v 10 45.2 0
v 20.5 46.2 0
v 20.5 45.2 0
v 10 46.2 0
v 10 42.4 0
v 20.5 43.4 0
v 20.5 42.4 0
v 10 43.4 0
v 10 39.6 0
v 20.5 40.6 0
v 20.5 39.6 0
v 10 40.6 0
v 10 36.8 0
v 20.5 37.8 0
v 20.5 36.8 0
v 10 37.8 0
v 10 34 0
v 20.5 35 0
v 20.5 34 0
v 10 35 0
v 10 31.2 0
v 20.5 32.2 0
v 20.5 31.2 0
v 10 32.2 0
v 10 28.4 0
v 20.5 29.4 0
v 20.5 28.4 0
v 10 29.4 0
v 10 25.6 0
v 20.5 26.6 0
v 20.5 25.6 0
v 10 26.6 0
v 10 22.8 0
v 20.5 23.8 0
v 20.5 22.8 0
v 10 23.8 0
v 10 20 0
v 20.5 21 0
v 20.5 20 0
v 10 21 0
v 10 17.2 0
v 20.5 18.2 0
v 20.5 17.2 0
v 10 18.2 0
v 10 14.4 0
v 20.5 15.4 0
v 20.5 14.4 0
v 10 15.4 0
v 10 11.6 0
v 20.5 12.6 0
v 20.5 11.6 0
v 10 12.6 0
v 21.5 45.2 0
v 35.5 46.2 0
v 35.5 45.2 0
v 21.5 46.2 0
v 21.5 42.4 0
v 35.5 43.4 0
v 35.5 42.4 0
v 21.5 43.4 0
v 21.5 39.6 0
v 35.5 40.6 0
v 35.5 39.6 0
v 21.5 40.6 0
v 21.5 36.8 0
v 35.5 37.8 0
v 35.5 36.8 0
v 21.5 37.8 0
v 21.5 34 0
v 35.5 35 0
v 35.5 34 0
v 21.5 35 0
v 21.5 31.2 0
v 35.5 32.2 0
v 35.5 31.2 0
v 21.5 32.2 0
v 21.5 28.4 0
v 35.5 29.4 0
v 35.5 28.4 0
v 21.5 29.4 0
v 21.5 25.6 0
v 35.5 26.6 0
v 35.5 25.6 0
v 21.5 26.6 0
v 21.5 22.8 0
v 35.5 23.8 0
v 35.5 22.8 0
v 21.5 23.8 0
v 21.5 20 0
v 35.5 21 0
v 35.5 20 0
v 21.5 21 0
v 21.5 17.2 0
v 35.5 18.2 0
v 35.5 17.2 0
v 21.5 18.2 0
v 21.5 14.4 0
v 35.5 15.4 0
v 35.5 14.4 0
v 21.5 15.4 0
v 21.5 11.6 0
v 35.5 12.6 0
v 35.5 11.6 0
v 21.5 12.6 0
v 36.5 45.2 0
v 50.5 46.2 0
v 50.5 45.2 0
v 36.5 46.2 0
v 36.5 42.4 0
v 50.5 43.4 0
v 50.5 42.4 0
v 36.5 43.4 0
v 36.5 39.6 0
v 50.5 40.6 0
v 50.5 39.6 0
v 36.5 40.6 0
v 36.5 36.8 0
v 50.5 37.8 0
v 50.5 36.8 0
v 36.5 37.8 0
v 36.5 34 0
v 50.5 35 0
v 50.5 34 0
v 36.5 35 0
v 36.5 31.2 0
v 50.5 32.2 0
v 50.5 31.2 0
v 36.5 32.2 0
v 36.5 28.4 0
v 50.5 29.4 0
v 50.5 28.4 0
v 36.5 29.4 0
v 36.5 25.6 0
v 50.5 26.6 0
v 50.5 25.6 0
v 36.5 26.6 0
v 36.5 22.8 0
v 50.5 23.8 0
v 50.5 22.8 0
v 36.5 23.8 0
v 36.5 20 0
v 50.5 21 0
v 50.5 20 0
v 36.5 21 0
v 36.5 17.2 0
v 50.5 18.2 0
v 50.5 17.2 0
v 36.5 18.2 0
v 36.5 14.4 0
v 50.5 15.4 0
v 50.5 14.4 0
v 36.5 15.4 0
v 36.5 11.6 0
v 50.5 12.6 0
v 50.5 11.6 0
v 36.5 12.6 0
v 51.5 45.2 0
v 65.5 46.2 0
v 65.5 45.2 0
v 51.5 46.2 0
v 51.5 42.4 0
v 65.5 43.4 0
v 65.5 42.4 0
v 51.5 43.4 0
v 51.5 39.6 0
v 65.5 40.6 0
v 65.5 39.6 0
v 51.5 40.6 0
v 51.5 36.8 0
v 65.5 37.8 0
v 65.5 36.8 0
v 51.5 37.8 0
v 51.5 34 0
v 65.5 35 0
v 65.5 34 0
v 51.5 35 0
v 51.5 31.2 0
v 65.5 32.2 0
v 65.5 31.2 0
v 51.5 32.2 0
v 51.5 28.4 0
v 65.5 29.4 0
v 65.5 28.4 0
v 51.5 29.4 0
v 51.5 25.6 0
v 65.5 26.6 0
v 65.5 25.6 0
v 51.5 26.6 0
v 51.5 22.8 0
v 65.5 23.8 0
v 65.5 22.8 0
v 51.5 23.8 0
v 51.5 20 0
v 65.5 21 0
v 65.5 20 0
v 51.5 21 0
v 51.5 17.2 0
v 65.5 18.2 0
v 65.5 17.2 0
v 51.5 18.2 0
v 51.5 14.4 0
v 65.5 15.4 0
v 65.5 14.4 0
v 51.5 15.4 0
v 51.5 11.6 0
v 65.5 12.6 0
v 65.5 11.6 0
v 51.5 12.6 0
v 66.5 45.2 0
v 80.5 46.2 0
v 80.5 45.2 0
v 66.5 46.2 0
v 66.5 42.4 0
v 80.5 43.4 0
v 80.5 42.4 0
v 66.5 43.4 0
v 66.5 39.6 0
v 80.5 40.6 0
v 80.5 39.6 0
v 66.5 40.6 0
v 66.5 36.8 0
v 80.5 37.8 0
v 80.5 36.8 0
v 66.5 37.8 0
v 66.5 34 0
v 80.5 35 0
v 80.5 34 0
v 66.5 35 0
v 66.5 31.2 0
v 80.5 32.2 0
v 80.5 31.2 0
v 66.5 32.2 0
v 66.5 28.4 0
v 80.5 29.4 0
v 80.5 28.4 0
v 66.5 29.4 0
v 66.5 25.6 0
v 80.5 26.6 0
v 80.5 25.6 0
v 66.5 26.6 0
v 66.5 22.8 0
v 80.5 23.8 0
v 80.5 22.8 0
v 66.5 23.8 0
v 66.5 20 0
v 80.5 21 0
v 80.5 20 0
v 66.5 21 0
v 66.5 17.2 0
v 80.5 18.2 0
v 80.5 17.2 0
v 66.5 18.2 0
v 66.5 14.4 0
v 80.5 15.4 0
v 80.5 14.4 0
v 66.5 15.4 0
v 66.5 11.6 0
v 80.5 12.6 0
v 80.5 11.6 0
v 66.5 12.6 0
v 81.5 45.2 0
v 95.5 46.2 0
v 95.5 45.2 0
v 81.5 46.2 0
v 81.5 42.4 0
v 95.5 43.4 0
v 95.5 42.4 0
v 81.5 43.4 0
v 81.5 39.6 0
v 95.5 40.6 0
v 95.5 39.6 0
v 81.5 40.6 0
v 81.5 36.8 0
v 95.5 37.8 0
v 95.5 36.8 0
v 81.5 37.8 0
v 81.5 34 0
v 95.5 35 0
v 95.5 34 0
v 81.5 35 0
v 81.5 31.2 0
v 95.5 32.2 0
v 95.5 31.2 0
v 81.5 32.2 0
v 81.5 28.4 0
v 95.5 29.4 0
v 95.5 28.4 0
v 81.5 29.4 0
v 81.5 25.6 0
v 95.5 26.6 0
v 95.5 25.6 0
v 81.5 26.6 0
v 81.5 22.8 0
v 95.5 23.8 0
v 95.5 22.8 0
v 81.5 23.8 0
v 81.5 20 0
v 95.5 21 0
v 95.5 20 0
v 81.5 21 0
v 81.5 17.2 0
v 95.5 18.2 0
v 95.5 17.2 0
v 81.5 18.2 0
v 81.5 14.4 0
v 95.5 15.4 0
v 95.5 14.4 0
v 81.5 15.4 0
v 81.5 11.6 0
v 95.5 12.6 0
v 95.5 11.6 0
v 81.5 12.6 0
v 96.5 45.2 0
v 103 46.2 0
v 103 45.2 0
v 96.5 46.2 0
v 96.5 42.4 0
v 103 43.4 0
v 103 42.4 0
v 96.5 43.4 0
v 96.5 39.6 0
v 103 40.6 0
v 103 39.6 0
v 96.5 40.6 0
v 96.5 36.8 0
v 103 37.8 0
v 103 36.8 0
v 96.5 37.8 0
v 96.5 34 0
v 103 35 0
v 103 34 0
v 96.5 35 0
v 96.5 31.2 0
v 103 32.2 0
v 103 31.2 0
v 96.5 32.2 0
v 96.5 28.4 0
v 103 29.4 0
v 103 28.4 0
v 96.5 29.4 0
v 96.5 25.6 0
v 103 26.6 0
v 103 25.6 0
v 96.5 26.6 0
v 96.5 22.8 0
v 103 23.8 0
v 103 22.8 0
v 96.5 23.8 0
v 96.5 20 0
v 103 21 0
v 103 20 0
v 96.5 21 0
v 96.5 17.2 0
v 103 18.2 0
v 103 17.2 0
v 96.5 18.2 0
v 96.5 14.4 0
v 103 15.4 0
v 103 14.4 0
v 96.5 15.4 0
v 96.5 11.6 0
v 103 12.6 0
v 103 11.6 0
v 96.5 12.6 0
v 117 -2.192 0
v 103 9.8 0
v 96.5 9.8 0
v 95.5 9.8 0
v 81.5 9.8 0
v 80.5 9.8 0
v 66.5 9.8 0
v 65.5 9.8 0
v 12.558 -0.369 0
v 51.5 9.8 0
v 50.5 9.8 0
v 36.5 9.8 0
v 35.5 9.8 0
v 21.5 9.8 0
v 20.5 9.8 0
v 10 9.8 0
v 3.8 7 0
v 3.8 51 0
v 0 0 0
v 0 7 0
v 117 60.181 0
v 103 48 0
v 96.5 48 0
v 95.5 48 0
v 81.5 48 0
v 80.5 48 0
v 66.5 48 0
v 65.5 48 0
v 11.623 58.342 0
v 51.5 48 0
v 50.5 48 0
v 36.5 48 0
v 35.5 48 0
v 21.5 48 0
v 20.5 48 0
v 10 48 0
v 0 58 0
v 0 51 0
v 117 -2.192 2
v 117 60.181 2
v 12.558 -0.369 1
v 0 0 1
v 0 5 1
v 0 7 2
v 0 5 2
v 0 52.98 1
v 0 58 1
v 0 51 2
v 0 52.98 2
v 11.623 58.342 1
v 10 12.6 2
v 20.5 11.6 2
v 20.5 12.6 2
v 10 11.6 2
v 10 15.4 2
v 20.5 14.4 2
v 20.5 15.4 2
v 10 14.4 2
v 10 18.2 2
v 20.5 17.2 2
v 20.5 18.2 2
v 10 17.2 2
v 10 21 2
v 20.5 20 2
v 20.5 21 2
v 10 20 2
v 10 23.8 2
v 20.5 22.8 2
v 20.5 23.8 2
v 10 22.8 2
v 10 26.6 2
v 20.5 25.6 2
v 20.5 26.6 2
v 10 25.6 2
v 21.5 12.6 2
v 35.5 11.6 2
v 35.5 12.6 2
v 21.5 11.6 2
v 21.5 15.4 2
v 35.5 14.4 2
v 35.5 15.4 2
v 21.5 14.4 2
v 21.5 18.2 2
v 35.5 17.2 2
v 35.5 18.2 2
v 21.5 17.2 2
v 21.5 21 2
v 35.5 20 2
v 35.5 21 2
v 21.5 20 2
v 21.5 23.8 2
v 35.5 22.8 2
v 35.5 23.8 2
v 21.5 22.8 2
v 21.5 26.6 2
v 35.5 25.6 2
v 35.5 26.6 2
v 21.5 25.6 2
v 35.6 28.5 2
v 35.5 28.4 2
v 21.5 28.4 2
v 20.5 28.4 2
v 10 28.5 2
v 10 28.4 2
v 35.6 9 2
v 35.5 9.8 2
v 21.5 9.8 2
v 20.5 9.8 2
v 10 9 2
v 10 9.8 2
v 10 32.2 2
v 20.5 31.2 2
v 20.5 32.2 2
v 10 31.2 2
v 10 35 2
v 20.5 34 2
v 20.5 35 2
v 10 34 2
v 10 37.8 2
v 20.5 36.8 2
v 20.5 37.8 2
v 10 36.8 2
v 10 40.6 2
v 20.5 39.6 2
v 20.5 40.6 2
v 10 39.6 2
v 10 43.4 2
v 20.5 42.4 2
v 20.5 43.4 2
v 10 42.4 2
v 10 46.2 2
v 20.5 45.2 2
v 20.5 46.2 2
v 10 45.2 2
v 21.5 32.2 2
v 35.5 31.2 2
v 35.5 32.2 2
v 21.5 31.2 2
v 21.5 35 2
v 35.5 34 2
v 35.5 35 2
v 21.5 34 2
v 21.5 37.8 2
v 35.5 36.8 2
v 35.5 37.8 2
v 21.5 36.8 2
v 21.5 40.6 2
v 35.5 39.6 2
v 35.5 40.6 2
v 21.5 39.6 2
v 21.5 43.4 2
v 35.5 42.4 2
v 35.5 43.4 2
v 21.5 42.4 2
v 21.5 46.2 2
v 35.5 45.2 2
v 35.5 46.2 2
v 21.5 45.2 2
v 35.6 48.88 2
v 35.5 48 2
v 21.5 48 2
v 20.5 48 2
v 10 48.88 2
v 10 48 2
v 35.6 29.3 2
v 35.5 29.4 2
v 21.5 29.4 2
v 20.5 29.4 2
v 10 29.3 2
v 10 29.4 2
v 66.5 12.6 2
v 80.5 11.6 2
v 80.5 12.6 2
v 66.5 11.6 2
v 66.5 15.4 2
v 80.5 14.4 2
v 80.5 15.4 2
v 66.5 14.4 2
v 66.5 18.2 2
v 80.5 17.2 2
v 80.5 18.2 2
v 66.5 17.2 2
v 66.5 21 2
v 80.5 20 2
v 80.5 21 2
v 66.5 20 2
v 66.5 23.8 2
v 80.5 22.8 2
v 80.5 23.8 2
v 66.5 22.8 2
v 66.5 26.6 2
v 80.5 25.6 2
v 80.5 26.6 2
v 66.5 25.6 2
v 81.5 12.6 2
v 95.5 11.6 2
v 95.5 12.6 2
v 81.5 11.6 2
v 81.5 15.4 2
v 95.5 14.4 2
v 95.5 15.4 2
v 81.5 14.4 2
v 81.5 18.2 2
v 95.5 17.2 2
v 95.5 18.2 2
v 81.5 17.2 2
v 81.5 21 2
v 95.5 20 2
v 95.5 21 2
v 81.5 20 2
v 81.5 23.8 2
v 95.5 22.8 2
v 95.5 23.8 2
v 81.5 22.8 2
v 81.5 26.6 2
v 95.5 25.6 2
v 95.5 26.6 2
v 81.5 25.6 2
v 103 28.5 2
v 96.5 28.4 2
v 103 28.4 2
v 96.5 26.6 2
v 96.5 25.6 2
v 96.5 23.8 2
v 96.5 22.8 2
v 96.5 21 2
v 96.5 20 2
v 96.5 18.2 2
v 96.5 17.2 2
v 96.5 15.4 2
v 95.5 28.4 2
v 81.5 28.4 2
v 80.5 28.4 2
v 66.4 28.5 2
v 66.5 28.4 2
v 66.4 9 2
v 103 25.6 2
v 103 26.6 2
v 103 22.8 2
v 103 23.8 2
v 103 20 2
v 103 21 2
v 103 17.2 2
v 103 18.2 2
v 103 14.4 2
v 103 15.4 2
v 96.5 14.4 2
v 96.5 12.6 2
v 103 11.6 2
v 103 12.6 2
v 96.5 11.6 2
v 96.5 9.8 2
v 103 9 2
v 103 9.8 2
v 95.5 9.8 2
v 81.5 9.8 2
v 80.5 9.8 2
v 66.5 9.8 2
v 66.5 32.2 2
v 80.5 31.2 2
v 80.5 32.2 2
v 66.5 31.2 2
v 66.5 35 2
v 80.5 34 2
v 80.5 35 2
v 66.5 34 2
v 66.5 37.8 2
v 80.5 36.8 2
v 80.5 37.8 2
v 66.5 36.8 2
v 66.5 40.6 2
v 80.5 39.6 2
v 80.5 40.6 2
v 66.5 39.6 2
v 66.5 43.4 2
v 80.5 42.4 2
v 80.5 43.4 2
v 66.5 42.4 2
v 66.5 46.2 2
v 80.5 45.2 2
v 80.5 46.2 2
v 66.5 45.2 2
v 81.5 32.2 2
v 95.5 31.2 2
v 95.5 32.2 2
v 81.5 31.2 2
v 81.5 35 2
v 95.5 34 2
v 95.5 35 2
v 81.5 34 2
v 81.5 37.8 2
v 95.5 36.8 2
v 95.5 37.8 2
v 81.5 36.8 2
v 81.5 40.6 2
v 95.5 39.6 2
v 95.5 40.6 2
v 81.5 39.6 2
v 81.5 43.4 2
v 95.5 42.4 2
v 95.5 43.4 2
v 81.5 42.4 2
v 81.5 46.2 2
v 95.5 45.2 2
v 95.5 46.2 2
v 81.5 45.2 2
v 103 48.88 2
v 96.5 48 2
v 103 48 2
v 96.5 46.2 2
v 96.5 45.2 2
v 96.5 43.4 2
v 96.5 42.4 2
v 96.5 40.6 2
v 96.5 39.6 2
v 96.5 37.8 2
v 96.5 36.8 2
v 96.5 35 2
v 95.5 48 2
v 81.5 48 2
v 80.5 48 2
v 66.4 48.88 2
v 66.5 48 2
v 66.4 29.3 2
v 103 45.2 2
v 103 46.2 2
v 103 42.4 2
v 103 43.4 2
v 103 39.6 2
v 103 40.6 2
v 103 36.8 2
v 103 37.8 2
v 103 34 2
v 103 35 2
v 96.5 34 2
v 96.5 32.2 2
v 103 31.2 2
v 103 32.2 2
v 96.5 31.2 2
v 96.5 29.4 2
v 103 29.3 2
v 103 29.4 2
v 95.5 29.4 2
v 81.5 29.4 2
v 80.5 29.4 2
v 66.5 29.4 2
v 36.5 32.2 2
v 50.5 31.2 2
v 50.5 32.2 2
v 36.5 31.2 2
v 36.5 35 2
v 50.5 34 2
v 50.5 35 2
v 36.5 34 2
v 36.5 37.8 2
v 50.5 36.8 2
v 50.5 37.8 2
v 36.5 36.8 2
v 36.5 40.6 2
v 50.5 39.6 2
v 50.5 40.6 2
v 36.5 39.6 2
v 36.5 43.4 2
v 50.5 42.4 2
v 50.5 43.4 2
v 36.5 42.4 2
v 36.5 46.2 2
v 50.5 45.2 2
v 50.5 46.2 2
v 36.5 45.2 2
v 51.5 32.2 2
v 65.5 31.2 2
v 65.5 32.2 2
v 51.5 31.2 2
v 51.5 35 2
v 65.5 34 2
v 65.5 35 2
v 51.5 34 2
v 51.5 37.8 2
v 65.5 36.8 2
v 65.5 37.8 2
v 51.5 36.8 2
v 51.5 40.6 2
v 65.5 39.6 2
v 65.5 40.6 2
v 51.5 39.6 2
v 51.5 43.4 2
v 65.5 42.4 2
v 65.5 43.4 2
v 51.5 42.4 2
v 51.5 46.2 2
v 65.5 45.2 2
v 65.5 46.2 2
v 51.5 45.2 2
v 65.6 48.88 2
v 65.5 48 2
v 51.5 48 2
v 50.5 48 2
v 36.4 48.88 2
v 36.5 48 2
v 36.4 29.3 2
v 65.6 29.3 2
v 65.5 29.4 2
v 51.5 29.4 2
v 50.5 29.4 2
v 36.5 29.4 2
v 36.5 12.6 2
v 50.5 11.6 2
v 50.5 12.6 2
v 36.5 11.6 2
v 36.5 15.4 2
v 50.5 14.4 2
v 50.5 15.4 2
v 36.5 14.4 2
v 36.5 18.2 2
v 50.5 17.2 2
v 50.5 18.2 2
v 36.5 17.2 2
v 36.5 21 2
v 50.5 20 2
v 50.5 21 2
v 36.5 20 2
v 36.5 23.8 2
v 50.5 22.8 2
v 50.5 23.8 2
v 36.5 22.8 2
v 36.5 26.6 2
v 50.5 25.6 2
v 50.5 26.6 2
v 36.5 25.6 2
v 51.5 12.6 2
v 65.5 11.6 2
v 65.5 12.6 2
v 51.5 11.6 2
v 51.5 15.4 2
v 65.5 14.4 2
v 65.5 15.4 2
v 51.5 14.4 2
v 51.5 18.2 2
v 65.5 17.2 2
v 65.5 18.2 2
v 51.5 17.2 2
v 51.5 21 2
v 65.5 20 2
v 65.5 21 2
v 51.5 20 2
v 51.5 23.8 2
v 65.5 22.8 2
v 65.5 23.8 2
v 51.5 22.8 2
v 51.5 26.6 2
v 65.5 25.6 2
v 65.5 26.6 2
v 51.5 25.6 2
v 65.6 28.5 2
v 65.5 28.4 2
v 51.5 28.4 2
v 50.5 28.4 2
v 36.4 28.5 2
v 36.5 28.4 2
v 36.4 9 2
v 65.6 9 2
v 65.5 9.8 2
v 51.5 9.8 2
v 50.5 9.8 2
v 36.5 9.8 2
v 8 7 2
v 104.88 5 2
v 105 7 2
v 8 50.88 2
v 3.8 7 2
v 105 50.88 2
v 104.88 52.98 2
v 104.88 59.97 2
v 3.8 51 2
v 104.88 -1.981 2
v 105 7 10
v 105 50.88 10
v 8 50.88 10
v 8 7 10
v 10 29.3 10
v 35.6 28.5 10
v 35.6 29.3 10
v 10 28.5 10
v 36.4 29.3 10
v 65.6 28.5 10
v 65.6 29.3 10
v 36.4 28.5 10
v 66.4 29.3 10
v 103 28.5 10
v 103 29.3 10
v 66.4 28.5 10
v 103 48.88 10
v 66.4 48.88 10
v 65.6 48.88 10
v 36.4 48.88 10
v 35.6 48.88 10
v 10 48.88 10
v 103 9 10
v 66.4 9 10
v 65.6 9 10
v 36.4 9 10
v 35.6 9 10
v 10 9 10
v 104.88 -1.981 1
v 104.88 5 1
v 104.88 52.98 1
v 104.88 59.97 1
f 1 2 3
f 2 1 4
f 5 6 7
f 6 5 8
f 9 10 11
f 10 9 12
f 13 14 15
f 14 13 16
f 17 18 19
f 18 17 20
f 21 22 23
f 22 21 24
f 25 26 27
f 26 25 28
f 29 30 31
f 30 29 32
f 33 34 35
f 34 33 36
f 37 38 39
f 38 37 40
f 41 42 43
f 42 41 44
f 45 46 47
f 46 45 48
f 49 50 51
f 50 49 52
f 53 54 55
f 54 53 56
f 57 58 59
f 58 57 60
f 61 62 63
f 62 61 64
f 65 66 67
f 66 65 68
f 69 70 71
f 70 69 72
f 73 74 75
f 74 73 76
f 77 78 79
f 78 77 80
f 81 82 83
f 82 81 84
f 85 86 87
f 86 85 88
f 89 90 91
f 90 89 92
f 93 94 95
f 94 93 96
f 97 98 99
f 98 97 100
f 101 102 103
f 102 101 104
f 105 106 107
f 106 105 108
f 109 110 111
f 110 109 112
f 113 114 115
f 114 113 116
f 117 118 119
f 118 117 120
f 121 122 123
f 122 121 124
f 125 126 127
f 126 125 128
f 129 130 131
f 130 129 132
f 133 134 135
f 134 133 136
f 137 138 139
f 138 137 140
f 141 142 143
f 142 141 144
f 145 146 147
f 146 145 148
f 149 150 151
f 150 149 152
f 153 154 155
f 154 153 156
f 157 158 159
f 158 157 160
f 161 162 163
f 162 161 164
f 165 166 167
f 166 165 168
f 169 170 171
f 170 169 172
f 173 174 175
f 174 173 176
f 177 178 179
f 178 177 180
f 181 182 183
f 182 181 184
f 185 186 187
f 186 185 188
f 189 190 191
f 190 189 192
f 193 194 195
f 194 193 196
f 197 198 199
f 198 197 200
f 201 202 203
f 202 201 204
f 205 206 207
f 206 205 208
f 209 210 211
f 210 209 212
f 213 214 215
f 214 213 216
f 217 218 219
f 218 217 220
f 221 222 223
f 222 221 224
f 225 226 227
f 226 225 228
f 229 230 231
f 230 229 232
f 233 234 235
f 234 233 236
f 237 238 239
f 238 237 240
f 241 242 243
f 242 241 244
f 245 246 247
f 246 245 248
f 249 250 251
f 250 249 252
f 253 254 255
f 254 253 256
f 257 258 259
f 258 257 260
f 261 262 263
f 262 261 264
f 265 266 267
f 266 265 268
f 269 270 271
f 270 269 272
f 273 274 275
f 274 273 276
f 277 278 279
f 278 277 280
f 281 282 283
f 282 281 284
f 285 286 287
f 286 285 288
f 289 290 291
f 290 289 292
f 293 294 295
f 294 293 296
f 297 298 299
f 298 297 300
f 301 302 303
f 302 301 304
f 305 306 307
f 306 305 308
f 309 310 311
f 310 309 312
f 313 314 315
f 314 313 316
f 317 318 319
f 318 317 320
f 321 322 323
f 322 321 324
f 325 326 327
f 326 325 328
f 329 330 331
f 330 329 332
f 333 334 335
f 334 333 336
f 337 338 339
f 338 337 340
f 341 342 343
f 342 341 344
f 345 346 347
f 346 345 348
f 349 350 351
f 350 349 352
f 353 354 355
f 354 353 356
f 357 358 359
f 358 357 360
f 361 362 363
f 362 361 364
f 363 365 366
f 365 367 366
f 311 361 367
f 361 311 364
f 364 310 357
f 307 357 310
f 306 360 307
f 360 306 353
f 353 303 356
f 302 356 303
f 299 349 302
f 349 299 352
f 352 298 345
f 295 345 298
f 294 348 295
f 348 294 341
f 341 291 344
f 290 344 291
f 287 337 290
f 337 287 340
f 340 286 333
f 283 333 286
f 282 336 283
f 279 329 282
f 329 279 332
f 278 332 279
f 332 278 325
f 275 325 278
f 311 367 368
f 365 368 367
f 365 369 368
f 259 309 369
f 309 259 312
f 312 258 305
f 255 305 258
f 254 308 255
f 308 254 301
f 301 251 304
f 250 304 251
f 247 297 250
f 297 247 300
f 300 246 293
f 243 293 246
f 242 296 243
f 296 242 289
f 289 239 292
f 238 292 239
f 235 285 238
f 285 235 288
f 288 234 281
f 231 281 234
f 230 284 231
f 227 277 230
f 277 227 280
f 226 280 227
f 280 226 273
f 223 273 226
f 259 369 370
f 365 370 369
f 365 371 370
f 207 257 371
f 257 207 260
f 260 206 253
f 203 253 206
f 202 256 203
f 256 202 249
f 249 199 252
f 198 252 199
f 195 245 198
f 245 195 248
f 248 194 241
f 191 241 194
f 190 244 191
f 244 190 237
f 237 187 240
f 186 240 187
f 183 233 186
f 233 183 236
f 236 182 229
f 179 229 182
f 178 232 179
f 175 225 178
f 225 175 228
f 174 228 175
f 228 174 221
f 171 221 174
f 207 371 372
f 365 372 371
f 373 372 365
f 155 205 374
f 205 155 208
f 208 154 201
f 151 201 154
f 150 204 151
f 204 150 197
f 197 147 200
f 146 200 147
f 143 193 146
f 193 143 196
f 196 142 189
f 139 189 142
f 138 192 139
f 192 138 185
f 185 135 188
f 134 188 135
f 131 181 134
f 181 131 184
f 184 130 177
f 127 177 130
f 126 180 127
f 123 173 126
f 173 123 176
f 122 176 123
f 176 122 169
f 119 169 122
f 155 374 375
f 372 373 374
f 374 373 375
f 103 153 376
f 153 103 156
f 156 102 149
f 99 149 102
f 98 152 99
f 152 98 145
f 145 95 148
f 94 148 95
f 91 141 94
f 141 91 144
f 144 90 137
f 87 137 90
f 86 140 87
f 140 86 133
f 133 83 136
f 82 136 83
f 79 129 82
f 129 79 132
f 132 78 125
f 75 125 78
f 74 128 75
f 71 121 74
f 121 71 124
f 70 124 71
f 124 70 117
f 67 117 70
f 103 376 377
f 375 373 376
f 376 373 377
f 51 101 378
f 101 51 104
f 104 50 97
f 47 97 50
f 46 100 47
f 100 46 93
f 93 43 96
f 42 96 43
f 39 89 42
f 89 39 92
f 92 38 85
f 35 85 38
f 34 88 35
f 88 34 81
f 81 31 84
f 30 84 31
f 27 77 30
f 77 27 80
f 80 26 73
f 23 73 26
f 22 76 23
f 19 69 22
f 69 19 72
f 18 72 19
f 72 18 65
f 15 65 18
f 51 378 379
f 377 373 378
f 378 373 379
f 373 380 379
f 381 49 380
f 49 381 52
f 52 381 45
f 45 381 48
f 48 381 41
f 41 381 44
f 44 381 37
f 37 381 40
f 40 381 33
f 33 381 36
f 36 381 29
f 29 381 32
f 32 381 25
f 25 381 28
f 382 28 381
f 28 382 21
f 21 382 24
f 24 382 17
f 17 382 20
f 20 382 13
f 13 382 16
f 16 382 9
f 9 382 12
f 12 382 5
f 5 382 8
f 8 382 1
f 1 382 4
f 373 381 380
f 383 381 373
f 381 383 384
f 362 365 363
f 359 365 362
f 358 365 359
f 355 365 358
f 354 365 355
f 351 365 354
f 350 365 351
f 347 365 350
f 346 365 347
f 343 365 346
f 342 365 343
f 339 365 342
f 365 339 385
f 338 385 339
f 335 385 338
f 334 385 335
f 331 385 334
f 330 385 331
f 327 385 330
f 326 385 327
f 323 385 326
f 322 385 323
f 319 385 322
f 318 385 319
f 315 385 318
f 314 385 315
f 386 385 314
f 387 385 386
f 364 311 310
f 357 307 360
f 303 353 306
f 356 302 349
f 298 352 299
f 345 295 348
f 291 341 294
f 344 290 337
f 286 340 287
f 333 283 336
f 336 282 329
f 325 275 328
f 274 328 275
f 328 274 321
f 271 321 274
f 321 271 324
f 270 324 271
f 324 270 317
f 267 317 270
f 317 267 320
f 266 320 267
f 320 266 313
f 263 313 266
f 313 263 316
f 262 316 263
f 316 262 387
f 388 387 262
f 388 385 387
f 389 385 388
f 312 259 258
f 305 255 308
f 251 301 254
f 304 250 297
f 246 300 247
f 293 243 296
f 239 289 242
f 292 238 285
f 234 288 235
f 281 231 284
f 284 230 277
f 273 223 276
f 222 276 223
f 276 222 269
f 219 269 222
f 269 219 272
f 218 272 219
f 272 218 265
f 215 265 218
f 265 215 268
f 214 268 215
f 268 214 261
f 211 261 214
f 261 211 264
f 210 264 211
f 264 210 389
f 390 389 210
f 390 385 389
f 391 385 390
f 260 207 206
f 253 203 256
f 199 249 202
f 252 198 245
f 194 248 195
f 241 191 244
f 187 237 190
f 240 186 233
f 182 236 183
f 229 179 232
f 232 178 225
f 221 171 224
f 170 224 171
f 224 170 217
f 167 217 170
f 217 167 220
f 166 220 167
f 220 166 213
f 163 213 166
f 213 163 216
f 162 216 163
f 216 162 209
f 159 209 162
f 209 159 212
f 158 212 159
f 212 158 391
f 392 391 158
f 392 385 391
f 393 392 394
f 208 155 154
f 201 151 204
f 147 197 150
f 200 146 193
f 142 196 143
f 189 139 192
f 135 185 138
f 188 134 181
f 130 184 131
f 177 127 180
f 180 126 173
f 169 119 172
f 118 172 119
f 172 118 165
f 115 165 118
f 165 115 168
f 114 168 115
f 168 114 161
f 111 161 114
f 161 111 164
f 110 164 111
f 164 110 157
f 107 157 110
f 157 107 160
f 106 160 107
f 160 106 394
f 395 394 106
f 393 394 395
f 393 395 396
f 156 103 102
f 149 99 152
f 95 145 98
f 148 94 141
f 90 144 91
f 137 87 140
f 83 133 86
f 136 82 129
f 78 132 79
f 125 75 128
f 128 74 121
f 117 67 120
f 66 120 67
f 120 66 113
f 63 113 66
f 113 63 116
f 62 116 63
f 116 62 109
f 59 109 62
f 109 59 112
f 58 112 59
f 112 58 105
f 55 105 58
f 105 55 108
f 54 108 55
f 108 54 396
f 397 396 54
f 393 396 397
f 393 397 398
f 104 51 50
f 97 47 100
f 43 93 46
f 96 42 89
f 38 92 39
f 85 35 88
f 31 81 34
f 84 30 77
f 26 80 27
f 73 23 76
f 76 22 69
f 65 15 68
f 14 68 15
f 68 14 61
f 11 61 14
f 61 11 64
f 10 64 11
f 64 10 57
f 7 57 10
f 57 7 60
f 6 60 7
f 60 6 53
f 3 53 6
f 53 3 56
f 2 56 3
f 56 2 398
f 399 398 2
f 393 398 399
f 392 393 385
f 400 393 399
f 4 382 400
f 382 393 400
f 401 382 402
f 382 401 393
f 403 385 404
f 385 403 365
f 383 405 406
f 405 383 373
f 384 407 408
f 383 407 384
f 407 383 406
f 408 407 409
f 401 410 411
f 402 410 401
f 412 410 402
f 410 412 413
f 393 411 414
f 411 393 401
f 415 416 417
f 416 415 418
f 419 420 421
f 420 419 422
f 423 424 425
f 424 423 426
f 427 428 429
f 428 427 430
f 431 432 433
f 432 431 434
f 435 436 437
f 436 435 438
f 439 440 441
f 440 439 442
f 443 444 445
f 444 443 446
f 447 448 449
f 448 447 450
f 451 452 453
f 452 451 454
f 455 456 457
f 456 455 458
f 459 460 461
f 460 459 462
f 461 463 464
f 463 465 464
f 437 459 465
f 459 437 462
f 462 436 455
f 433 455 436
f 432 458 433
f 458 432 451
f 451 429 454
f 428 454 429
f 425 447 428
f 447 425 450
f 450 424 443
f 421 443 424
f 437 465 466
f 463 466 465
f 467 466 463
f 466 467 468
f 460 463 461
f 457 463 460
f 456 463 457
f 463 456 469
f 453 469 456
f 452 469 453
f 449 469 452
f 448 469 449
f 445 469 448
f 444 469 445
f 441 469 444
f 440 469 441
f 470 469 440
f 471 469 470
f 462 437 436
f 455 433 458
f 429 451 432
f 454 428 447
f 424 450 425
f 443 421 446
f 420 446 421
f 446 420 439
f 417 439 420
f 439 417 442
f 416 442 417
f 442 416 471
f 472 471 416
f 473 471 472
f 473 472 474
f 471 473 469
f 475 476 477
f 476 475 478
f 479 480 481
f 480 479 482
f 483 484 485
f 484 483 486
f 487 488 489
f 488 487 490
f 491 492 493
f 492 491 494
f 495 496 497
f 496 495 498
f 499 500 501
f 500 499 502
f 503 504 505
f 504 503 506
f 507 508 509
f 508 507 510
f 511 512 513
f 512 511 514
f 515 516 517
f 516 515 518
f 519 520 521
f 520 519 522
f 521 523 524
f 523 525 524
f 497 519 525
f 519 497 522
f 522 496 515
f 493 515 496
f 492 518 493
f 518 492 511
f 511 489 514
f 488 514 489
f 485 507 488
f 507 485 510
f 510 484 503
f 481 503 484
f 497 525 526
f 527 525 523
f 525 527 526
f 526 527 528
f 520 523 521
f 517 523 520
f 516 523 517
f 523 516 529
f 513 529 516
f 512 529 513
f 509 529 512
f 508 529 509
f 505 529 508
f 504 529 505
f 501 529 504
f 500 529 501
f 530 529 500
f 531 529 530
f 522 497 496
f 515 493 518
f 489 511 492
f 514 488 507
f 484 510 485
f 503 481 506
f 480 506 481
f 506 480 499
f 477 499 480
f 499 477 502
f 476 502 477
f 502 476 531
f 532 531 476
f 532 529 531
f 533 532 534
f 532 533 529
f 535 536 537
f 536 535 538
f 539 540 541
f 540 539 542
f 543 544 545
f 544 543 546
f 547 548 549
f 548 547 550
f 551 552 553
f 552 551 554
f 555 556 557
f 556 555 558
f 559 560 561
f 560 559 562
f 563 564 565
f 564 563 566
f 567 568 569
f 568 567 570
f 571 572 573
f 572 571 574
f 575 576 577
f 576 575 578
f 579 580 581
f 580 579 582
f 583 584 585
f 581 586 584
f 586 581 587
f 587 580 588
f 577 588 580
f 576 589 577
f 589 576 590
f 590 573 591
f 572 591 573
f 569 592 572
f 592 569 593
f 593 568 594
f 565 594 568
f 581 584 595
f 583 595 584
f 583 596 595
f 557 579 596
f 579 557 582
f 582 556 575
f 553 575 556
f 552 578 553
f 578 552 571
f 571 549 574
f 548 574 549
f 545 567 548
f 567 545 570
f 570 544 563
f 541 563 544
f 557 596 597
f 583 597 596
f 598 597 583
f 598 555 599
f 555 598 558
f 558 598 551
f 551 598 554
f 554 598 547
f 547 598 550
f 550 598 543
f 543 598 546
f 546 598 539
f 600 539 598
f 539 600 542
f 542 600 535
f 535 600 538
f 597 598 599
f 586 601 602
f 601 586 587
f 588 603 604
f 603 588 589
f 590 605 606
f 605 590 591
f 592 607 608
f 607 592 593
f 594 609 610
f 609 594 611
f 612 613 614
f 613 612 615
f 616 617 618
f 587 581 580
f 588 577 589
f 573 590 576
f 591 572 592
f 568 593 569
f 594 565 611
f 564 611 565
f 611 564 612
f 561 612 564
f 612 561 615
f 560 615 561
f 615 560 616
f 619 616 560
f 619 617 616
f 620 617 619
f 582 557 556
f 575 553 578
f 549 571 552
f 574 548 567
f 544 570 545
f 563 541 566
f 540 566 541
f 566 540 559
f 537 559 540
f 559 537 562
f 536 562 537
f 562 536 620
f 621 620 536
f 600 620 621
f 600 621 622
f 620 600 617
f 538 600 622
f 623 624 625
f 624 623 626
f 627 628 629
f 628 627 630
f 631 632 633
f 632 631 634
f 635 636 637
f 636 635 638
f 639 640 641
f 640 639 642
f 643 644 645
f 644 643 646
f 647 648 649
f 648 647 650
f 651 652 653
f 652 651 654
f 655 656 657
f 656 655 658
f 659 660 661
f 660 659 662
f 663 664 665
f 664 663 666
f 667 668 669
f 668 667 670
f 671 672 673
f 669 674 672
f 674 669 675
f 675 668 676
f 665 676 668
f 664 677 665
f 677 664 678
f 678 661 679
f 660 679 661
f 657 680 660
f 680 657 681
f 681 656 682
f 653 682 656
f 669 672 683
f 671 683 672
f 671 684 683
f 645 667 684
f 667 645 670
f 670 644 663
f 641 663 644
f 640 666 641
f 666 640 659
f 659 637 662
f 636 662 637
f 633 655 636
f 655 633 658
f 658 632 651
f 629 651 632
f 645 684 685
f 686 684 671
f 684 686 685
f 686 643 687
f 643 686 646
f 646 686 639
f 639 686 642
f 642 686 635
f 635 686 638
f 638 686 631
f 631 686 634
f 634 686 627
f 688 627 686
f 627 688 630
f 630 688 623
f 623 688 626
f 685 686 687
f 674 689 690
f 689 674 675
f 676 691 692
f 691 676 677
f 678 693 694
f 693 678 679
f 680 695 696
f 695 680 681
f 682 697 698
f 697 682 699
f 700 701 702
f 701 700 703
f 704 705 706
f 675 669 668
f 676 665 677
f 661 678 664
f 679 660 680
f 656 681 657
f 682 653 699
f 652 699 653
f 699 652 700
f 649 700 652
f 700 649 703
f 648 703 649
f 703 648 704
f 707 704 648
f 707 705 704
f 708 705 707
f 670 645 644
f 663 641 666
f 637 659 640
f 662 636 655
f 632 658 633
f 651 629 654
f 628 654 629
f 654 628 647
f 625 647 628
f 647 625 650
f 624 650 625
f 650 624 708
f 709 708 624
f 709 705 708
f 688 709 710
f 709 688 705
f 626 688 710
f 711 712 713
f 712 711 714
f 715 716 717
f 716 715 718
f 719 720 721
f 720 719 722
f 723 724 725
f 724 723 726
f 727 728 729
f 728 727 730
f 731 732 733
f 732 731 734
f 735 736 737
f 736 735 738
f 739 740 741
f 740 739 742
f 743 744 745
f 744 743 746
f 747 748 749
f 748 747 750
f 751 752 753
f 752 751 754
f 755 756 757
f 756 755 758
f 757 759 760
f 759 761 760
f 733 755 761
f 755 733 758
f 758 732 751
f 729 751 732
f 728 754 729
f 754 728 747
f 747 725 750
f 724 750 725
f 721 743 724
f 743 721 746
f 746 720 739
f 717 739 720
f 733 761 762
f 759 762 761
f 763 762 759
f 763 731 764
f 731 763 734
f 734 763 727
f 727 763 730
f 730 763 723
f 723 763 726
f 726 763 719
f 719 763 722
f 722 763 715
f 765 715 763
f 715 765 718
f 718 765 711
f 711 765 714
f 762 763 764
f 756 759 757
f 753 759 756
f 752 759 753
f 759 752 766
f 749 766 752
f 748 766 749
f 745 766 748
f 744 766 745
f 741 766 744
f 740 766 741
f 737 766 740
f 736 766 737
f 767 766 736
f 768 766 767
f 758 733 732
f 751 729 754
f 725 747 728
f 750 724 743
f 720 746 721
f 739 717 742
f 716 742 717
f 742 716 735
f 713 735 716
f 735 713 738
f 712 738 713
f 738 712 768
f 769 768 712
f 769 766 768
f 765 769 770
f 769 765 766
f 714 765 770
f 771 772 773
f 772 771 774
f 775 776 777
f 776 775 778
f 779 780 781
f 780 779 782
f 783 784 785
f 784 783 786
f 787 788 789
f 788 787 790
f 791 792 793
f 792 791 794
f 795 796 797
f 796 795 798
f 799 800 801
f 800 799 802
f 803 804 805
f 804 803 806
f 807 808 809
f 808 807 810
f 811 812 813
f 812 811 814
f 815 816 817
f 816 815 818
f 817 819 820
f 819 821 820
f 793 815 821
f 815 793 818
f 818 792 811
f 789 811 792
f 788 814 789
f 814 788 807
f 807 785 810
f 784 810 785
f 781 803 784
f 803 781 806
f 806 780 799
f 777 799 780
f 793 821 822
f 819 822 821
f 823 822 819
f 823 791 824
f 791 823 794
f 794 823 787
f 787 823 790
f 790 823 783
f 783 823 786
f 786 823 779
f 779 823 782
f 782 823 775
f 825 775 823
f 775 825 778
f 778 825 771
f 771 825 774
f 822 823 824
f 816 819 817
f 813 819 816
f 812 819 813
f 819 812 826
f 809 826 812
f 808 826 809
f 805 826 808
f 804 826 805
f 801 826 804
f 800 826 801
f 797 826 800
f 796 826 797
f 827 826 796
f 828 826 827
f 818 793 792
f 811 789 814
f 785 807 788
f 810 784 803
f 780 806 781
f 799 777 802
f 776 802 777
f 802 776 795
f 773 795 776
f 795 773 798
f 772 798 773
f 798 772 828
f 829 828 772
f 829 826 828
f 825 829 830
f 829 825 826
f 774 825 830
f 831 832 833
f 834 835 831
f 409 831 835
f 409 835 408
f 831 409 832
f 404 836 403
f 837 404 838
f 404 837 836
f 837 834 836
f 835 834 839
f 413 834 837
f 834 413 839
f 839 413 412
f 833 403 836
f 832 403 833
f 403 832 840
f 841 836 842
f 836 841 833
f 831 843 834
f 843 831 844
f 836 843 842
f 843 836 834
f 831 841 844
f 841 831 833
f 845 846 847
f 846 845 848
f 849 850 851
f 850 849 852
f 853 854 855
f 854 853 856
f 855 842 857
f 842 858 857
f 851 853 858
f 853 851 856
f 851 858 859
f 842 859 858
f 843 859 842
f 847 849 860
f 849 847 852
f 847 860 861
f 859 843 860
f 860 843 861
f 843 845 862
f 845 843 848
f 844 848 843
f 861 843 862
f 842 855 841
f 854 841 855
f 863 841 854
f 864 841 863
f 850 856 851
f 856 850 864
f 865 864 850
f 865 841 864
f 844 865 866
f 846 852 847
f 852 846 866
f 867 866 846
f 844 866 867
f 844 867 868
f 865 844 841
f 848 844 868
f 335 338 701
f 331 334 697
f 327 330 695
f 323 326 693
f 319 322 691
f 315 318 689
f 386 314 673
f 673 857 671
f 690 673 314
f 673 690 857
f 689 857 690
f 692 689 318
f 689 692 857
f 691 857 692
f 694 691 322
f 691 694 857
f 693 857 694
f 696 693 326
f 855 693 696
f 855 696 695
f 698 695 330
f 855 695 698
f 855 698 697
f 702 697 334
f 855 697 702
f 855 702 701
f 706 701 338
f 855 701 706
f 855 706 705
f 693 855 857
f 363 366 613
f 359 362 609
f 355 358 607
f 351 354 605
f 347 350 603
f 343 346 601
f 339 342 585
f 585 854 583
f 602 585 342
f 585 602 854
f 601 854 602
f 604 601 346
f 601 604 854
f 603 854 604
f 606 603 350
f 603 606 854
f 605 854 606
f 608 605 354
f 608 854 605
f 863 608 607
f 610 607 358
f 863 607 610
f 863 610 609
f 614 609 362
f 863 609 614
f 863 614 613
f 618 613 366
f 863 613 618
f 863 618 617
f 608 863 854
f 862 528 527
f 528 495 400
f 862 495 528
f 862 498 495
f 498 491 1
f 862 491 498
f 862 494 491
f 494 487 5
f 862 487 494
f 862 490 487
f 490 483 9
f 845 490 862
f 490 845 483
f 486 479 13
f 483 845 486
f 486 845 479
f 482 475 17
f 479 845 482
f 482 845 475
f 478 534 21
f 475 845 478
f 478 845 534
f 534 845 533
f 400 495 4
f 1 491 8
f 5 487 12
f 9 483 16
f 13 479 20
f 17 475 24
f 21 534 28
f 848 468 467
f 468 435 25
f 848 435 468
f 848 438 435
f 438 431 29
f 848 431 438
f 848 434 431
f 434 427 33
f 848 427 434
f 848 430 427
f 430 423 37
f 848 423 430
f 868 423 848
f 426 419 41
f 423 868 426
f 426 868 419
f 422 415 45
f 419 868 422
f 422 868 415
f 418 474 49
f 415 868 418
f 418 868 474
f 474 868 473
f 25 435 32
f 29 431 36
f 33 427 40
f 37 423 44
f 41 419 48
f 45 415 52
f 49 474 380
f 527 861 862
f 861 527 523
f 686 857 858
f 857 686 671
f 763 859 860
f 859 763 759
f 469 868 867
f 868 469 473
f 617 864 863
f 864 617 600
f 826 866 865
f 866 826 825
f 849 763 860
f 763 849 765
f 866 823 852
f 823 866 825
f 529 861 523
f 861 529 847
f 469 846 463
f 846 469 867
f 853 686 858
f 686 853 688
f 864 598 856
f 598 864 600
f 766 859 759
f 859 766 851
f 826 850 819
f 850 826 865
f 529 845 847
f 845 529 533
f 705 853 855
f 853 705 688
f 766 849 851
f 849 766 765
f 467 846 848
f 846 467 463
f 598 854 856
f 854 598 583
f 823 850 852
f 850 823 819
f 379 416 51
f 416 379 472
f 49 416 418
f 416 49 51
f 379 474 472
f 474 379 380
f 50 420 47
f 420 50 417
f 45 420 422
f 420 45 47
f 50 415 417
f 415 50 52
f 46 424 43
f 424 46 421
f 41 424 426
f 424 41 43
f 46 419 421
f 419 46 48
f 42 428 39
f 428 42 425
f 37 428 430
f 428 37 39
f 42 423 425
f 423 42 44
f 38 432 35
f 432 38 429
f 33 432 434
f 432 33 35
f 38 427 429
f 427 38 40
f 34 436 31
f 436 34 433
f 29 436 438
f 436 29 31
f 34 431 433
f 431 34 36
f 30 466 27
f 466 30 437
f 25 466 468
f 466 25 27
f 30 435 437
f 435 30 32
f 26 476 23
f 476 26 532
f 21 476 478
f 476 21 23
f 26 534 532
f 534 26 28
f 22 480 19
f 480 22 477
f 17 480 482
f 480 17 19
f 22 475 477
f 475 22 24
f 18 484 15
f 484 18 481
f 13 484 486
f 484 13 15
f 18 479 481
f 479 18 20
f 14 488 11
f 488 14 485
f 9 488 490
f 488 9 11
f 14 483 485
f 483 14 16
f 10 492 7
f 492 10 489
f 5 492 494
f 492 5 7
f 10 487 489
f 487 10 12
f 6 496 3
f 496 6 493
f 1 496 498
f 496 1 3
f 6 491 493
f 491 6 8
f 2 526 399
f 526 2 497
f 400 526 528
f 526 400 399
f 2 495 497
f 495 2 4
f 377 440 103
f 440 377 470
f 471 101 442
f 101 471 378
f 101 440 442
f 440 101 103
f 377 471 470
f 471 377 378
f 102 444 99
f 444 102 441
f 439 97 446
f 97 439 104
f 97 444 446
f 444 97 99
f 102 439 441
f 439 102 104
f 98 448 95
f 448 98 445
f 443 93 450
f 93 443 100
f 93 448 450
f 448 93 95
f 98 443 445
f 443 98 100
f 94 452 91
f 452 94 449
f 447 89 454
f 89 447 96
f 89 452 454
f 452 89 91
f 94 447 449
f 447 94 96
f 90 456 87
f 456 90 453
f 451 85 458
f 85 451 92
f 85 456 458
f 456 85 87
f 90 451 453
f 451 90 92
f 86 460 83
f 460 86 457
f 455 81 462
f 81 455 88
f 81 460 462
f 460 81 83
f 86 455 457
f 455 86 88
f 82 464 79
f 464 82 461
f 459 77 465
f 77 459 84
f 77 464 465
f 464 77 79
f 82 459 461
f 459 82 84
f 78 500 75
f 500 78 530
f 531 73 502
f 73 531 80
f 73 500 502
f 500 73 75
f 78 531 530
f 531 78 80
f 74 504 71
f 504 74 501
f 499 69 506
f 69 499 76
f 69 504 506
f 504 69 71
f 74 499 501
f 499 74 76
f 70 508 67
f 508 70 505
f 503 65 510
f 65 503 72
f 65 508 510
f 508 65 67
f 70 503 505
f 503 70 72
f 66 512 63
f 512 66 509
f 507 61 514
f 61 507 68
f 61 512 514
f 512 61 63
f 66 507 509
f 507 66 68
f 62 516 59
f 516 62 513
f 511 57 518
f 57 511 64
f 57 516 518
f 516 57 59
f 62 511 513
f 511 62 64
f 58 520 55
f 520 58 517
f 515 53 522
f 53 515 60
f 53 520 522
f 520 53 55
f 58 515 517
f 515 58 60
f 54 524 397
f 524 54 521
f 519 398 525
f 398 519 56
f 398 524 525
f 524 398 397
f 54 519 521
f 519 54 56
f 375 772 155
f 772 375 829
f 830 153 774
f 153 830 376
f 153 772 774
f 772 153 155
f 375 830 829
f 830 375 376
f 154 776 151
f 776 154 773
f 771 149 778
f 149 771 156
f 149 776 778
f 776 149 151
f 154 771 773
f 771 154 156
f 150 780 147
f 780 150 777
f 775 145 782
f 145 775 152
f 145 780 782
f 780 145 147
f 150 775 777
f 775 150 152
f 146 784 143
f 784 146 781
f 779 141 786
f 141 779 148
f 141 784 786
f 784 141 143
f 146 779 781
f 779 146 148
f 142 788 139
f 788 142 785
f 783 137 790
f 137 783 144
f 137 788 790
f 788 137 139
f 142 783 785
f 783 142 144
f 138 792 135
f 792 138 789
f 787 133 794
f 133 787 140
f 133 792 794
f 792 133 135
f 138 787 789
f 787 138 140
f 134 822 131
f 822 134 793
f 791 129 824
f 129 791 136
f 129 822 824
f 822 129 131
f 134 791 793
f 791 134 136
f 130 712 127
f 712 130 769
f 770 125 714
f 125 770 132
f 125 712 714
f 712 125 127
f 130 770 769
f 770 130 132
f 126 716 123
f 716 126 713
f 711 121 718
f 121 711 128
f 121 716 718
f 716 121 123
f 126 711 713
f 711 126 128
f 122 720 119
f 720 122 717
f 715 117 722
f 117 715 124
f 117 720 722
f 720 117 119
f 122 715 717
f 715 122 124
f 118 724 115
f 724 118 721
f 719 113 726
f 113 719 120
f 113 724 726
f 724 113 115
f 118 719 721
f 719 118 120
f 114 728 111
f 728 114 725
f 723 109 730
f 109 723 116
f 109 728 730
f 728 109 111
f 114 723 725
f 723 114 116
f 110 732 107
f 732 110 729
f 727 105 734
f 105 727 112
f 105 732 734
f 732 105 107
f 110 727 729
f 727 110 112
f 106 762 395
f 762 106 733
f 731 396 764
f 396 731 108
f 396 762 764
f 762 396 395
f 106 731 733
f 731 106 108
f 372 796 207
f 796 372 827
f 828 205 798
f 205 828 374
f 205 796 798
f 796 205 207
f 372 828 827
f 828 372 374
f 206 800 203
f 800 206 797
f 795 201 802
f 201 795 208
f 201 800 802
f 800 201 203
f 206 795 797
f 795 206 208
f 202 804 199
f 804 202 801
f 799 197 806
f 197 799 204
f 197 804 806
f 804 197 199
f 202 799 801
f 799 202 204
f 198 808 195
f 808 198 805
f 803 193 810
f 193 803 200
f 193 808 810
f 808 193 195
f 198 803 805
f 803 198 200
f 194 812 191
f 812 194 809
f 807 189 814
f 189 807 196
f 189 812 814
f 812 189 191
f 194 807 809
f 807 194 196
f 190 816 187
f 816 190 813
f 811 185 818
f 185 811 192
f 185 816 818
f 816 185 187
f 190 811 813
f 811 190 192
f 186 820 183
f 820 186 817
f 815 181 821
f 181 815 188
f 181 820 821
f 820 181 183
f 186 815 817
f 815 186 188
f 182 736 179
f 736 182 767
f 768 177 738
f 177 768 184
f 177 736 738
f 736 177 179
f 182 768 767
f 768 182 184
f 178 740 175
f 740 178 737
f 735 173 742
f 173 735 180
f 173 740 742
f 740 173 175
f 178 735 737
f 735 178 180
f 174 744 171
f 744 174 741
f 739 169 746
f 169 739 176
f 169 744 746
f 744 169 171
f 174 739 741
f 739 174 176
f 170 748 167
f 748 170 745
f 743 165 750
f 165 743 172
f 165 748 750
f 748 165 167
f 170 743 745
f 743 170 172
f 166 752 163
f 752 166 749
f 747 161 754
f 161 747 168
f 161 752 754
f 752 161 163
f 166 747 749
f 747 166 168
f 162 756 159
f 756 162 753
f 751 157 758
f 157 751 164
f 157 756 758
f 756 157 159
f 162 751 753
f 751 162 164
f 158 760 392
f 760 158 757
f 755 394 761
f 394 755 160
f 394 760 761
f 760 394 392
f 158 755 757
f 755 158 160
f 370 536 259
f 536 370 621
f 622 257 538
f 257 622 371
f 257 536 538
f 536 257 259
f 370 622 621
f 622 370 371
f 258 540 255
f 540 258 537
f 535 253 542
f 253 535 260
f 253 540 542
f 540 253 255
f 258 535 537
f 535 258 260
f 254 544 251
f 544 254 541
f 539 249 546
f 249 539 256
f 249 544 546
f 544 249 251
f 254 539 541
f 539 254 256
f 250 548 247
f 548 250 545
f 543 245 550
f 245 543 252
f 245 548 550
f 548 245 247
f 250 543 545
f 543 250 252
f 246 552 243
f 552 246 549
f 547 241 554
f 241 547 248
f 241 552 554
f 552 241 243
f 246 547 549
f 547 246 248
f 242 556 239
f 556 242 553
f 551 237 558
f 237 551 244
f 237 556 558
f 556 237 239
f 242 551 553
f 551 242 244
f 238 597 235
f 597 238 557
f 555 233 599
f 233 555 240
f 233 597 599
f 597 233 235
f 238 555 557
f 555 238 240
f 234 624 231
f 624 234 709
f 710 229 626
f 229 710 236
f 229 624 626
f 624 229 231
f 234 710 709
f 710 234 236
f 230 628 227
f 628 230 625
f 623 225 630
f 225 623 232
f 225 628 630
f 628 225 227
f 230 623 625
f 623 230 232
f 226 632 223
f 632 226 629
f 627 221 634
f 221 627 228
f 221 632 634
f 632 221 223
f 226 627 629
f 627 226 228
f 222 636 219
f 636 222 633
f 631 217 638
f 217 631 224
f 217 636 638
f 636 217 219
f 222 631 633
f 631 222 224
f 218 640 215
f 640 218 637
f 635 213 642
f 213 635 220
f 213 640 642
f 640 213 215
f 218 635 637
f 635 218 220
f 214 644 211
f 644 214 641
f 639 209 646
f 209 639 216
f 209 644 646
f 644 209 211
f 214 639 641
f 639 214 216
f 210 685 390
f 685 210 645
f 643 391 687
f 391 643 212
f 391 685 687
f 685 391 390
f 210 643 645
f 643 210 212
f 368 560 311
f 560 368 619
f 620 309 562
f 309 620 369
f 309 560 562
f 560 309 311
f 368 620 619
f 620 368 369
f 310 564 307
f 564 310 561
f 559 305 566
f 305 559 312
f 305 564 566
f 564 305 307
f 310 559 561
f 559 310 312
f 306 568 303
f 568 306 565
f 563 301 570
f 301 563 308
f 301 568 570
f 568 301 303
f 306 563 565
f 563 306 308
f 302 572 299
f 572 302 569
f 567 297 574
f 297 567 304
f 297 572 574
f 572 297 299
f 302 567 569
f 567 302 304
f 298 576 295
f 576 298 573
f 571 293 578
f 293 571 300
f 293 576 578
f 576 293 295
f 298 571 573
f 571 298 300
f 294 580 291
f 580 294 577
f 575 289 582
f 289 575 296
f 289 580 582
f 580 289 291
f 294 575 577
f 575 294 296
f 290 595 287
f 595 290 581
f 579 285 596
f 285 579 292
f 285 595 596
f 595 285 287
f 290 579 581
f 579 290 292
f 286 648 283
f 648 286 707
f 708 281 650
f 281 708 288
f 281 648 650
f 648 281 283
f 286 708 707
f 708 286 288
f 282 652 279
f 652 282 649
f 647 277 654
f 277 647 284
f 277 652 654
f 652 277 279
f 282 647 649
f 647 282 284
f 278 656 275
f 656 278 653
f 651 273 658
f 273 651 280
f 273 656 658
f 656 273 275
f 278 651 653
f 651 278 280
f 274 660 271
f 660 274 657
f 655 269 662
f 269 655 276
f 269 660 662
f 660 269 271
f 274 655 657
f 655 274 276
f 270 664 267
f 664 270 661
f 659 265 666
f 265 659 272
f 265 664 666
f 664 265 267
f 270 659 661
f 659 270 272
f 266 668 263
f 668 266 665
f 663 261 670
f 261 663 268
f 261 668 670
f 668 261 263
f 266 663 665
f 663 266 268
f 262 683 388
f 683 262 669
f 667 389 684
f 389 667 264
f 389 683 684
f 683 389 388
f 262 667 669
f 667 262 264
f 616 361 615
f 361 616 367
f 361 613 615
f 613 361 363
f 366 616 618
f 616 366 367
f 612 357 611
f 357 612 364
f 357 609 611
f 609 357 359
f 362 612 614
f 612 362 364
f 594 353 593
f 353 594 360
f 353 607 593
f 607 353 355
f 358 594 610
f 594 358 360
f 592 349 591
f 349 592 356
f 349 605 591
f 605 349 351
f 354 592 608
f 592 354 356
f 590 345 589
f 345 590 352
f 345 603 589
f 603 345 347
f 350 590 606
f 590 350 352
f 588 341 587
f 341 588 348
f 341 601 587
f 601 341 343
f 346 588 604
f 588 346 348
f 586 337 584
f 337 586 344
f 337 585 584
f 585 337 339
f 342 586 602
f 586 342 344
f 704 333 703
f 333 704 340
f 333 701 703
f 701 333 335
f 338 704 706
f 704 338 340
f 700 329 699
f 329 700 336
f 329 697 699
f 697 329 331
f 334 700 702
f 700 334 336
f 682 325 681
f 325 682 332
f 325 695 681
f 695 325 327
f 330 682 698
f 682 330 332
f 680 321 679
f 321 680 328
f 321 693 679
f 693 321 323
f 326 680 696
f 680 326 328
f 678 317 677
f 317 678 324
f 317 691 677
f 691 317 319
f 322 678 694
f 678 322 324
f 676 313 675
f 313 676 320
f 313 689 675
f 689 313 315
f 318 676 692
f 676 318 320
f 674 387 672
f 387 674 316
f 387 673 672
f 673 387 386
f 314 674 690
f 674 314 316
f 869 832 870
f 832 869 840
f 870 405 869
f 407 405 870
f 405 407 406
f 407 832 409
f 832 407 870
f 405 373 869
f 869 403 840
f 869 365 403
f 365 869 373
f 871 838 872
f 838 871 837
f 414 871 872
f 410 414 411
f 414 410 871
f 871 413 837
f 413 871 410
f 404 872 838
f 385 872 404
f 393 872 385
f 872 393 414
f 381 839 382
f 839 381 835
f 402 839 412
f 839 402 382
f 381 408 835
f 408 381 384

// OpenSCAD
//labeled combo box for string
Opcao_Gerar="P"; // [P:Principal, T:Topo]

seleciona();

module seleciona() {
  if (Opcao_Gerar == "P") makePrincipal();
  if (Opcao_Gerar == "T") makeTopo();
}

//parametros
lMin = 58;
lMax = 64.88; //63
comp = 117;
altura = 2;
bordaL = 15;
heigth = 10;

// --------------------------------------------
module makePrincipal(addEncaixe = true) {
    difference() {
    union() {
        body();
        if (addEncaixe == true) addEncaixe();

        gridPattern();
    }

    bodyCorte();
    }
}

module makeTopo() {
    //color("black")
    //translate([0,0,2])
    bodyTopo();
}

module cuteBottom() {
  translate([-6.2,7,-2])
  color("black")
  cube([10,44,6]);
}

module addEncaixe() {
iMax = lMax - bordaL - (4+2);
icomp = comp - bordaL - 5;

union() {
    difference() {

    color("red")
    translate([bordaL-(9-2),bordaL-(10-2),0])
    cube([icomp,iMax,heigth]);

    color("blue")
    translate([bordaL-(9-4),bordaL-(10-4),-2])
    cube([icomp - 4,iMax - 4,19]);

    }
    
//traves
translate([bordaL+25-4.4,bordaL-(10-2),0])
cube([0.8,iMax,heigth]);

translate([bordaL+60-9.4,bordaL-(10-2),0])
cube([0.8,iMax,heigth]);

translate([bordaL-7,(lMin/2)-0.5,0])
cube([icomp,0.8,heigth]);
}
    
}


module bodyTopo() {
iMax = lMax - bordaL - (4+2) + 2.4;
icomp = comp - bordaL - 5 + 2.4;
dif = 1;
//dif = 0;

difference() {

color("red")
cube([icomp+10-3-(dif*2),iMax+8-(dif*2),3], center=true);

color("blue")
translate([0,0,-1])
cube([icomp-2,iMax-2,6], center=true);

}
    
}

module bodyCorte() {
    brd = 5;
    dDif = 2;
    eDif = 11.9;
    
    translate([0,0,-1])
    rotate([0,-0,0]) {
        translate([-2,-dDif,2])
        cube([lMax+42,brd+dDif,altura*2]);
        rotate([0,0,-1])
        translate([-2,-dDif-5.15,0])
        cube([lMax+60,brd+dDif,altura*2]);

        translate([-2,lMax-eDif,2])
        cube([lMax+42,brd+dDif,altura*2]);
        rotate([0,0,1])
        translate([-2,lMax+5.15-eDif,0])
        cube([lMax+60,brd+dDif,altura*2]);
    }
    
    cuteBottom();
}

module body() {
    difference() {
        bodyExterno();
        bodyInterno();
    }
}

module bodyExterno() {
    linear_extrude(height=altura, center=false, convexity=10)
    polygon_body();
}

module bodyInterno() {
    iMax = lMax - bordaL - (4+2);
    icomp = comp - bordaL - 5;

    translate([bordaL-(9-2),bordaL-(10-2),-1])
    cube([icomp,iMax,altura*2]);
}

module polygon_body(diferenca = 0) {
    diferenca = diferenca * 2;
    lMin = (lMin - diferenca);
    lMax = (lMax - diferenca);
    comp = 117 - (diferenca * 1.2);
    lDif = (lMax - lMin) / 2;

    polygon([[0,0],[comp,-lDif],[comp,lMin+lDif],[0,lMin]]);
}



module gridPattern() {

translate([6.5,5])
difference() {
    color("green")
    cube([103,47.5,2]);

    
    union() {
    translate([0,-0.8,-1])
    color("gray")
    {for (a =[0:6]) {
        for (b =[0:17]) {
            aa = a + (a * 14);
            ba = b + (b * 1.8);
            translate([aa,ba,0])
            cube([14,1.8,4]);
        }
    }}}
}
}
